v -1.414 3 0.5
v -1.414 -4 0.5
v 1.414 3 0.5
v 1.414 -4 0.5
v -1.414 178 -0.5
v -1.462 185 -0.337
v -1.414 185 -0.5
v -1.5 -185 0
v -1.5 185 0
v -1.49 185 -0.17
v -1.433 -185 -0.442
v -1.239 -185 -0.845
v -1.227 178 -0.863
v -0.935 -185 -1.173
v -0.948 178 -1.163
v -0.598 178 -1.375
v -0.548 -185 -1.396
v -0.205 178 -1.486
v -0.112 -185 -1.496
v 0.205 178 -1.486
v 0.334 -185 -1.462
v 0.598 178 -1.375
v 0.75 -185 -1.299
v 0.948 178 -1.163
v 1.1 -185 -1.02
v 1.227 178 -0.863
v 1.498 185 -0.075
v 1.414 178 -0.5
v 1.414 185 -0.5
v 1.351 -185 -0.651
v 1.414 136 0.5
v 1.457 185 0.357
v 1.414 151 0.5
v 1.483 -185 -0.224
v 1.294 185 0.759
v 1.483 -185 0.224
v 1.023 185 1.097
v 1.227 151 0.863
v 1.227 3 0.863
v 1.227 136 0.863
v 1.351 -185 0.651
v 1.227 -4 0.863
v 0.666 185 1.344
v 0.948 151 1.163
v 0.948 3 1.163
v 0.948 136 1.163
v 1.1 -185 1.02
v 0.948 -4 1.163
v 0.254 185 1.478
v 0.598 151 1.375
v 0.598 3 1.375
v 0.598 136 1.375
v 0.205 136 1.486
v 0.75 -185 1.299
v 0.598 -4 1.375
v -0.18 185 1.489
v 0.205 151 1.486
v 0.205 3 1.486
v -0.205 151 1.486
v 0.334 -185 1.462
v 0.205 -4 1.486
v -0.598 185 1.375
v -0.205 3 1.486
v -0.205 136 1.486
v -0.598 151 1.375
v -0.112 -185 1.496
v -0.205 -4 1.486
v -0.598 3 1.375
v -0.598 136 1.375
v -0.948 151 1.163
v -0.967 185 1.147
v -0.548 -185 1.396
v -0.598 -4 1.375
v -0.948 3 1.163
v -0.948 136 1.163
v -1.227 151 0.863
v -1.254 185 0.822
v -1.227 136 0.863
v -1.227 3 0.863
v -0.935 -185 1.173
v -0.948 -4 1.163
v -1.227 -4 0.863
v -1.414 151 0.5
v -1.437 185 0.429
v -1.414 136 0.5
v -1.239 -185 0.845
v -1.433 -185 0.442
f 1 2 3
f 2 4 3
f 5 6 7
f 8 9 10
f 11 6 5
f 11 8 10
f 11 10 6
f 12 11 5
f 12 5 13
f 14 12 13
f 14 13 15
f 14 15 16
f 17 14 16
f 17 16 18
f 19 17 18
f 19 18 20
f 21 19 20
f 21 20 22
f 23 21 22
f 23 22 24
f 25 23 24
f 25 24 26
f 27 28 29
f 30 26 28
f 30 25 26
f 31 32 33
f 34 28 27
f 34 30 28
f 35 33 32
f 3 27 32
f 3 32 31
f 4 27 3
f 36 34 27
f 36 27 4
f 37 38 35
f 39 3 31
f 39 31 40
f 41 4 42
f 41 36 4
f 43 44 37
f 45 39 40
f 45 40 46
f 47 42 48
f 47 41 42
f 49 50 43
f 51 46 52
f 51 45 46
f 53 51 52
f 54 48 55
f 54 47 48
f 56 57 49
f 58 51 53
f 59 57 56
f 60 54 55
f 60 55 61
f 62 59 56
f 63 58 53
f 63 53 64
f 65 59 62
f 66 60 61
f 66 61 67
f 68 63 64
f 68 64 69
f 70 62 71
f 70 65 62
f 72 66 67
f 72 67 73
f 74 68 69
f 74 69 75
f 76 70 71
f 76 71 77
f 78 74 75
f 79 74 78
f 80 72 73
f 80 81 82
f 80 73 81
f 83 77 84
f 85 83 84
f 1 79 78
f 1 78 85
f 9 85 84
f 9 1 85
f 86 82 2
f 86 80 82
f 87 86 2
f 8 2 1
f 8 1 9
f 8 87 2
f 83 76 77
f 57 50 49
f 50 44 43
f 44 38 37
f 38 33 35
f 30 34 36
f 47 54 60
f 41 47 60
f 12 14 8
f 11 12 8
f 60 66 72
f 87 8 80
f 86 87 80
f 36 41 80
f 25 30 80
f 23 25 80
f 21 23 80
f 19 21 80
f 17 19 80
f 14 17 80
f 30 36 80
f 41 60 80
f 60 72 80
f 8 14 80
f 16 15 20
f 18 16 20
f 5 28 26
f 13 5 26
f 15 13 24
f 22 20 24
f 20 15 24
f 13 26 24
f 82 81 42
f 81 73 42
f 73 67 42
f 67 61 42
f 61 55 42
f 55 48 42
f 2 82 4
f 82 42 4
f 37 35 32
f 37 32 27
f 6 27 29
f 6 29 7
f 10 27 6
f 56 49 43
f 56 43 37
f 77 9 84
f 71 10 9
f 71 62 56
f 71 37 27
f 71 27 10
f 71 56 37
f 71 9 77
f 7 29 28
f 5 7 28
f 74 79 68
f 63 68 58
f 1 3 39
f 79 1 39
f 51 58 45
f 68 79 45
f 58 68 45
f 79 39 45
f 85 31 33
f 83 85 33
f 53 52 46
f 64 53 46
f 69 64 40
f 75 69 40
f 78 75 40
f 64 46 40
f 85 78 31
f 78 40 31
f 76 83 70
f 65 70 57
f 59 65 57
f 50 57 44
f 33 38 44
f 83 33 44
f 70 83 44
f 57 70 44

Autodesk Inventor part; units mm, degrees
ref_plane "YZ Plane" through (0, 0, 0) normal (1, 0, 0) x (0, 1, 0)
ref_plane "XZ Plane" through (0, 0, 0) normal (0, 1, 0) x (-1, 0, 0)
ref_plane "XY Plane" through (0, 0, 0) normal (0, 0, 1) x (1, 0, 0)
sketch "Sketch4" plane through (0, 0, 0) normal (0, 1, 0) x (-1, 0, 0)
  circle A0 centre (0, 0) radius 1.5
extrude "Extrusion2" add sketch "Sketch4" along normal mid plane 370
sketch "Sketch13" plane through (0, 0, 0) normal (1, 0, 0) x (0, 1, 0)
  line L0 (185.7937, -0.5) -> (178, -0.5)
  line L1 (178, -0.5) -> (178, -2.4686)
  line L2 (178, -2.4686) -> (185.7937, -2.4686)
  line L3 (185.7937, -2.4686) -> (185.7937, -0.5)
  line L4 (-185, -1.5) -> (185, -1.5) projected
  line L5 (185, -1.5) -> (185, 1.5) projected
  line L6 (151, 2.5026) -> (136, 2.5026)
  line L7 (136, 2.5026) -> (136, 0.5)
  line L8 (136, 0.5) -> (151, 0.5)
  line L9 (151, 0.5) -> (151, 2.5026)
  line L10 (-185, 1.5) -> (185, 1.5) projected
  line L11 (-185, 1.5) -> (-185, -1.5) projected
  line L12 (3, 4.5) -> (-4, 4.5)
  line L13 (-4, 4.5) -> (-4, 0.5)
  line L14 (-4, 0.5) -> (3, 0.5)
  line L15 (3, 0.5) -> (3, 4.5)
  point P0 (0, 0)
  point P1 (151, 1.5)
  point P2 (136, 1.5)
  point P3 (185, -0.5)
  point P4 (178, -1.5)
  dimension "d89" = 1
  dimension "d90" = 7
  dimension "d91" = 1
  dimension "d92" = 15
  dimension "d96" = 34
  dimension "d97" = 1
  dimension "d98" = 7
  dimension "d99" = 182
extrude "Extrusion9" cut sketch "Sketch13" against normal through all both and the other way through all contours L5 L4 L1 L0 | L9 L8 L7 L10 | L15 L14 L13 L10 | L10 L13 L12 L15
properties part number "Rotating Rod 370mm" material "Bronze, Soft Tin"
